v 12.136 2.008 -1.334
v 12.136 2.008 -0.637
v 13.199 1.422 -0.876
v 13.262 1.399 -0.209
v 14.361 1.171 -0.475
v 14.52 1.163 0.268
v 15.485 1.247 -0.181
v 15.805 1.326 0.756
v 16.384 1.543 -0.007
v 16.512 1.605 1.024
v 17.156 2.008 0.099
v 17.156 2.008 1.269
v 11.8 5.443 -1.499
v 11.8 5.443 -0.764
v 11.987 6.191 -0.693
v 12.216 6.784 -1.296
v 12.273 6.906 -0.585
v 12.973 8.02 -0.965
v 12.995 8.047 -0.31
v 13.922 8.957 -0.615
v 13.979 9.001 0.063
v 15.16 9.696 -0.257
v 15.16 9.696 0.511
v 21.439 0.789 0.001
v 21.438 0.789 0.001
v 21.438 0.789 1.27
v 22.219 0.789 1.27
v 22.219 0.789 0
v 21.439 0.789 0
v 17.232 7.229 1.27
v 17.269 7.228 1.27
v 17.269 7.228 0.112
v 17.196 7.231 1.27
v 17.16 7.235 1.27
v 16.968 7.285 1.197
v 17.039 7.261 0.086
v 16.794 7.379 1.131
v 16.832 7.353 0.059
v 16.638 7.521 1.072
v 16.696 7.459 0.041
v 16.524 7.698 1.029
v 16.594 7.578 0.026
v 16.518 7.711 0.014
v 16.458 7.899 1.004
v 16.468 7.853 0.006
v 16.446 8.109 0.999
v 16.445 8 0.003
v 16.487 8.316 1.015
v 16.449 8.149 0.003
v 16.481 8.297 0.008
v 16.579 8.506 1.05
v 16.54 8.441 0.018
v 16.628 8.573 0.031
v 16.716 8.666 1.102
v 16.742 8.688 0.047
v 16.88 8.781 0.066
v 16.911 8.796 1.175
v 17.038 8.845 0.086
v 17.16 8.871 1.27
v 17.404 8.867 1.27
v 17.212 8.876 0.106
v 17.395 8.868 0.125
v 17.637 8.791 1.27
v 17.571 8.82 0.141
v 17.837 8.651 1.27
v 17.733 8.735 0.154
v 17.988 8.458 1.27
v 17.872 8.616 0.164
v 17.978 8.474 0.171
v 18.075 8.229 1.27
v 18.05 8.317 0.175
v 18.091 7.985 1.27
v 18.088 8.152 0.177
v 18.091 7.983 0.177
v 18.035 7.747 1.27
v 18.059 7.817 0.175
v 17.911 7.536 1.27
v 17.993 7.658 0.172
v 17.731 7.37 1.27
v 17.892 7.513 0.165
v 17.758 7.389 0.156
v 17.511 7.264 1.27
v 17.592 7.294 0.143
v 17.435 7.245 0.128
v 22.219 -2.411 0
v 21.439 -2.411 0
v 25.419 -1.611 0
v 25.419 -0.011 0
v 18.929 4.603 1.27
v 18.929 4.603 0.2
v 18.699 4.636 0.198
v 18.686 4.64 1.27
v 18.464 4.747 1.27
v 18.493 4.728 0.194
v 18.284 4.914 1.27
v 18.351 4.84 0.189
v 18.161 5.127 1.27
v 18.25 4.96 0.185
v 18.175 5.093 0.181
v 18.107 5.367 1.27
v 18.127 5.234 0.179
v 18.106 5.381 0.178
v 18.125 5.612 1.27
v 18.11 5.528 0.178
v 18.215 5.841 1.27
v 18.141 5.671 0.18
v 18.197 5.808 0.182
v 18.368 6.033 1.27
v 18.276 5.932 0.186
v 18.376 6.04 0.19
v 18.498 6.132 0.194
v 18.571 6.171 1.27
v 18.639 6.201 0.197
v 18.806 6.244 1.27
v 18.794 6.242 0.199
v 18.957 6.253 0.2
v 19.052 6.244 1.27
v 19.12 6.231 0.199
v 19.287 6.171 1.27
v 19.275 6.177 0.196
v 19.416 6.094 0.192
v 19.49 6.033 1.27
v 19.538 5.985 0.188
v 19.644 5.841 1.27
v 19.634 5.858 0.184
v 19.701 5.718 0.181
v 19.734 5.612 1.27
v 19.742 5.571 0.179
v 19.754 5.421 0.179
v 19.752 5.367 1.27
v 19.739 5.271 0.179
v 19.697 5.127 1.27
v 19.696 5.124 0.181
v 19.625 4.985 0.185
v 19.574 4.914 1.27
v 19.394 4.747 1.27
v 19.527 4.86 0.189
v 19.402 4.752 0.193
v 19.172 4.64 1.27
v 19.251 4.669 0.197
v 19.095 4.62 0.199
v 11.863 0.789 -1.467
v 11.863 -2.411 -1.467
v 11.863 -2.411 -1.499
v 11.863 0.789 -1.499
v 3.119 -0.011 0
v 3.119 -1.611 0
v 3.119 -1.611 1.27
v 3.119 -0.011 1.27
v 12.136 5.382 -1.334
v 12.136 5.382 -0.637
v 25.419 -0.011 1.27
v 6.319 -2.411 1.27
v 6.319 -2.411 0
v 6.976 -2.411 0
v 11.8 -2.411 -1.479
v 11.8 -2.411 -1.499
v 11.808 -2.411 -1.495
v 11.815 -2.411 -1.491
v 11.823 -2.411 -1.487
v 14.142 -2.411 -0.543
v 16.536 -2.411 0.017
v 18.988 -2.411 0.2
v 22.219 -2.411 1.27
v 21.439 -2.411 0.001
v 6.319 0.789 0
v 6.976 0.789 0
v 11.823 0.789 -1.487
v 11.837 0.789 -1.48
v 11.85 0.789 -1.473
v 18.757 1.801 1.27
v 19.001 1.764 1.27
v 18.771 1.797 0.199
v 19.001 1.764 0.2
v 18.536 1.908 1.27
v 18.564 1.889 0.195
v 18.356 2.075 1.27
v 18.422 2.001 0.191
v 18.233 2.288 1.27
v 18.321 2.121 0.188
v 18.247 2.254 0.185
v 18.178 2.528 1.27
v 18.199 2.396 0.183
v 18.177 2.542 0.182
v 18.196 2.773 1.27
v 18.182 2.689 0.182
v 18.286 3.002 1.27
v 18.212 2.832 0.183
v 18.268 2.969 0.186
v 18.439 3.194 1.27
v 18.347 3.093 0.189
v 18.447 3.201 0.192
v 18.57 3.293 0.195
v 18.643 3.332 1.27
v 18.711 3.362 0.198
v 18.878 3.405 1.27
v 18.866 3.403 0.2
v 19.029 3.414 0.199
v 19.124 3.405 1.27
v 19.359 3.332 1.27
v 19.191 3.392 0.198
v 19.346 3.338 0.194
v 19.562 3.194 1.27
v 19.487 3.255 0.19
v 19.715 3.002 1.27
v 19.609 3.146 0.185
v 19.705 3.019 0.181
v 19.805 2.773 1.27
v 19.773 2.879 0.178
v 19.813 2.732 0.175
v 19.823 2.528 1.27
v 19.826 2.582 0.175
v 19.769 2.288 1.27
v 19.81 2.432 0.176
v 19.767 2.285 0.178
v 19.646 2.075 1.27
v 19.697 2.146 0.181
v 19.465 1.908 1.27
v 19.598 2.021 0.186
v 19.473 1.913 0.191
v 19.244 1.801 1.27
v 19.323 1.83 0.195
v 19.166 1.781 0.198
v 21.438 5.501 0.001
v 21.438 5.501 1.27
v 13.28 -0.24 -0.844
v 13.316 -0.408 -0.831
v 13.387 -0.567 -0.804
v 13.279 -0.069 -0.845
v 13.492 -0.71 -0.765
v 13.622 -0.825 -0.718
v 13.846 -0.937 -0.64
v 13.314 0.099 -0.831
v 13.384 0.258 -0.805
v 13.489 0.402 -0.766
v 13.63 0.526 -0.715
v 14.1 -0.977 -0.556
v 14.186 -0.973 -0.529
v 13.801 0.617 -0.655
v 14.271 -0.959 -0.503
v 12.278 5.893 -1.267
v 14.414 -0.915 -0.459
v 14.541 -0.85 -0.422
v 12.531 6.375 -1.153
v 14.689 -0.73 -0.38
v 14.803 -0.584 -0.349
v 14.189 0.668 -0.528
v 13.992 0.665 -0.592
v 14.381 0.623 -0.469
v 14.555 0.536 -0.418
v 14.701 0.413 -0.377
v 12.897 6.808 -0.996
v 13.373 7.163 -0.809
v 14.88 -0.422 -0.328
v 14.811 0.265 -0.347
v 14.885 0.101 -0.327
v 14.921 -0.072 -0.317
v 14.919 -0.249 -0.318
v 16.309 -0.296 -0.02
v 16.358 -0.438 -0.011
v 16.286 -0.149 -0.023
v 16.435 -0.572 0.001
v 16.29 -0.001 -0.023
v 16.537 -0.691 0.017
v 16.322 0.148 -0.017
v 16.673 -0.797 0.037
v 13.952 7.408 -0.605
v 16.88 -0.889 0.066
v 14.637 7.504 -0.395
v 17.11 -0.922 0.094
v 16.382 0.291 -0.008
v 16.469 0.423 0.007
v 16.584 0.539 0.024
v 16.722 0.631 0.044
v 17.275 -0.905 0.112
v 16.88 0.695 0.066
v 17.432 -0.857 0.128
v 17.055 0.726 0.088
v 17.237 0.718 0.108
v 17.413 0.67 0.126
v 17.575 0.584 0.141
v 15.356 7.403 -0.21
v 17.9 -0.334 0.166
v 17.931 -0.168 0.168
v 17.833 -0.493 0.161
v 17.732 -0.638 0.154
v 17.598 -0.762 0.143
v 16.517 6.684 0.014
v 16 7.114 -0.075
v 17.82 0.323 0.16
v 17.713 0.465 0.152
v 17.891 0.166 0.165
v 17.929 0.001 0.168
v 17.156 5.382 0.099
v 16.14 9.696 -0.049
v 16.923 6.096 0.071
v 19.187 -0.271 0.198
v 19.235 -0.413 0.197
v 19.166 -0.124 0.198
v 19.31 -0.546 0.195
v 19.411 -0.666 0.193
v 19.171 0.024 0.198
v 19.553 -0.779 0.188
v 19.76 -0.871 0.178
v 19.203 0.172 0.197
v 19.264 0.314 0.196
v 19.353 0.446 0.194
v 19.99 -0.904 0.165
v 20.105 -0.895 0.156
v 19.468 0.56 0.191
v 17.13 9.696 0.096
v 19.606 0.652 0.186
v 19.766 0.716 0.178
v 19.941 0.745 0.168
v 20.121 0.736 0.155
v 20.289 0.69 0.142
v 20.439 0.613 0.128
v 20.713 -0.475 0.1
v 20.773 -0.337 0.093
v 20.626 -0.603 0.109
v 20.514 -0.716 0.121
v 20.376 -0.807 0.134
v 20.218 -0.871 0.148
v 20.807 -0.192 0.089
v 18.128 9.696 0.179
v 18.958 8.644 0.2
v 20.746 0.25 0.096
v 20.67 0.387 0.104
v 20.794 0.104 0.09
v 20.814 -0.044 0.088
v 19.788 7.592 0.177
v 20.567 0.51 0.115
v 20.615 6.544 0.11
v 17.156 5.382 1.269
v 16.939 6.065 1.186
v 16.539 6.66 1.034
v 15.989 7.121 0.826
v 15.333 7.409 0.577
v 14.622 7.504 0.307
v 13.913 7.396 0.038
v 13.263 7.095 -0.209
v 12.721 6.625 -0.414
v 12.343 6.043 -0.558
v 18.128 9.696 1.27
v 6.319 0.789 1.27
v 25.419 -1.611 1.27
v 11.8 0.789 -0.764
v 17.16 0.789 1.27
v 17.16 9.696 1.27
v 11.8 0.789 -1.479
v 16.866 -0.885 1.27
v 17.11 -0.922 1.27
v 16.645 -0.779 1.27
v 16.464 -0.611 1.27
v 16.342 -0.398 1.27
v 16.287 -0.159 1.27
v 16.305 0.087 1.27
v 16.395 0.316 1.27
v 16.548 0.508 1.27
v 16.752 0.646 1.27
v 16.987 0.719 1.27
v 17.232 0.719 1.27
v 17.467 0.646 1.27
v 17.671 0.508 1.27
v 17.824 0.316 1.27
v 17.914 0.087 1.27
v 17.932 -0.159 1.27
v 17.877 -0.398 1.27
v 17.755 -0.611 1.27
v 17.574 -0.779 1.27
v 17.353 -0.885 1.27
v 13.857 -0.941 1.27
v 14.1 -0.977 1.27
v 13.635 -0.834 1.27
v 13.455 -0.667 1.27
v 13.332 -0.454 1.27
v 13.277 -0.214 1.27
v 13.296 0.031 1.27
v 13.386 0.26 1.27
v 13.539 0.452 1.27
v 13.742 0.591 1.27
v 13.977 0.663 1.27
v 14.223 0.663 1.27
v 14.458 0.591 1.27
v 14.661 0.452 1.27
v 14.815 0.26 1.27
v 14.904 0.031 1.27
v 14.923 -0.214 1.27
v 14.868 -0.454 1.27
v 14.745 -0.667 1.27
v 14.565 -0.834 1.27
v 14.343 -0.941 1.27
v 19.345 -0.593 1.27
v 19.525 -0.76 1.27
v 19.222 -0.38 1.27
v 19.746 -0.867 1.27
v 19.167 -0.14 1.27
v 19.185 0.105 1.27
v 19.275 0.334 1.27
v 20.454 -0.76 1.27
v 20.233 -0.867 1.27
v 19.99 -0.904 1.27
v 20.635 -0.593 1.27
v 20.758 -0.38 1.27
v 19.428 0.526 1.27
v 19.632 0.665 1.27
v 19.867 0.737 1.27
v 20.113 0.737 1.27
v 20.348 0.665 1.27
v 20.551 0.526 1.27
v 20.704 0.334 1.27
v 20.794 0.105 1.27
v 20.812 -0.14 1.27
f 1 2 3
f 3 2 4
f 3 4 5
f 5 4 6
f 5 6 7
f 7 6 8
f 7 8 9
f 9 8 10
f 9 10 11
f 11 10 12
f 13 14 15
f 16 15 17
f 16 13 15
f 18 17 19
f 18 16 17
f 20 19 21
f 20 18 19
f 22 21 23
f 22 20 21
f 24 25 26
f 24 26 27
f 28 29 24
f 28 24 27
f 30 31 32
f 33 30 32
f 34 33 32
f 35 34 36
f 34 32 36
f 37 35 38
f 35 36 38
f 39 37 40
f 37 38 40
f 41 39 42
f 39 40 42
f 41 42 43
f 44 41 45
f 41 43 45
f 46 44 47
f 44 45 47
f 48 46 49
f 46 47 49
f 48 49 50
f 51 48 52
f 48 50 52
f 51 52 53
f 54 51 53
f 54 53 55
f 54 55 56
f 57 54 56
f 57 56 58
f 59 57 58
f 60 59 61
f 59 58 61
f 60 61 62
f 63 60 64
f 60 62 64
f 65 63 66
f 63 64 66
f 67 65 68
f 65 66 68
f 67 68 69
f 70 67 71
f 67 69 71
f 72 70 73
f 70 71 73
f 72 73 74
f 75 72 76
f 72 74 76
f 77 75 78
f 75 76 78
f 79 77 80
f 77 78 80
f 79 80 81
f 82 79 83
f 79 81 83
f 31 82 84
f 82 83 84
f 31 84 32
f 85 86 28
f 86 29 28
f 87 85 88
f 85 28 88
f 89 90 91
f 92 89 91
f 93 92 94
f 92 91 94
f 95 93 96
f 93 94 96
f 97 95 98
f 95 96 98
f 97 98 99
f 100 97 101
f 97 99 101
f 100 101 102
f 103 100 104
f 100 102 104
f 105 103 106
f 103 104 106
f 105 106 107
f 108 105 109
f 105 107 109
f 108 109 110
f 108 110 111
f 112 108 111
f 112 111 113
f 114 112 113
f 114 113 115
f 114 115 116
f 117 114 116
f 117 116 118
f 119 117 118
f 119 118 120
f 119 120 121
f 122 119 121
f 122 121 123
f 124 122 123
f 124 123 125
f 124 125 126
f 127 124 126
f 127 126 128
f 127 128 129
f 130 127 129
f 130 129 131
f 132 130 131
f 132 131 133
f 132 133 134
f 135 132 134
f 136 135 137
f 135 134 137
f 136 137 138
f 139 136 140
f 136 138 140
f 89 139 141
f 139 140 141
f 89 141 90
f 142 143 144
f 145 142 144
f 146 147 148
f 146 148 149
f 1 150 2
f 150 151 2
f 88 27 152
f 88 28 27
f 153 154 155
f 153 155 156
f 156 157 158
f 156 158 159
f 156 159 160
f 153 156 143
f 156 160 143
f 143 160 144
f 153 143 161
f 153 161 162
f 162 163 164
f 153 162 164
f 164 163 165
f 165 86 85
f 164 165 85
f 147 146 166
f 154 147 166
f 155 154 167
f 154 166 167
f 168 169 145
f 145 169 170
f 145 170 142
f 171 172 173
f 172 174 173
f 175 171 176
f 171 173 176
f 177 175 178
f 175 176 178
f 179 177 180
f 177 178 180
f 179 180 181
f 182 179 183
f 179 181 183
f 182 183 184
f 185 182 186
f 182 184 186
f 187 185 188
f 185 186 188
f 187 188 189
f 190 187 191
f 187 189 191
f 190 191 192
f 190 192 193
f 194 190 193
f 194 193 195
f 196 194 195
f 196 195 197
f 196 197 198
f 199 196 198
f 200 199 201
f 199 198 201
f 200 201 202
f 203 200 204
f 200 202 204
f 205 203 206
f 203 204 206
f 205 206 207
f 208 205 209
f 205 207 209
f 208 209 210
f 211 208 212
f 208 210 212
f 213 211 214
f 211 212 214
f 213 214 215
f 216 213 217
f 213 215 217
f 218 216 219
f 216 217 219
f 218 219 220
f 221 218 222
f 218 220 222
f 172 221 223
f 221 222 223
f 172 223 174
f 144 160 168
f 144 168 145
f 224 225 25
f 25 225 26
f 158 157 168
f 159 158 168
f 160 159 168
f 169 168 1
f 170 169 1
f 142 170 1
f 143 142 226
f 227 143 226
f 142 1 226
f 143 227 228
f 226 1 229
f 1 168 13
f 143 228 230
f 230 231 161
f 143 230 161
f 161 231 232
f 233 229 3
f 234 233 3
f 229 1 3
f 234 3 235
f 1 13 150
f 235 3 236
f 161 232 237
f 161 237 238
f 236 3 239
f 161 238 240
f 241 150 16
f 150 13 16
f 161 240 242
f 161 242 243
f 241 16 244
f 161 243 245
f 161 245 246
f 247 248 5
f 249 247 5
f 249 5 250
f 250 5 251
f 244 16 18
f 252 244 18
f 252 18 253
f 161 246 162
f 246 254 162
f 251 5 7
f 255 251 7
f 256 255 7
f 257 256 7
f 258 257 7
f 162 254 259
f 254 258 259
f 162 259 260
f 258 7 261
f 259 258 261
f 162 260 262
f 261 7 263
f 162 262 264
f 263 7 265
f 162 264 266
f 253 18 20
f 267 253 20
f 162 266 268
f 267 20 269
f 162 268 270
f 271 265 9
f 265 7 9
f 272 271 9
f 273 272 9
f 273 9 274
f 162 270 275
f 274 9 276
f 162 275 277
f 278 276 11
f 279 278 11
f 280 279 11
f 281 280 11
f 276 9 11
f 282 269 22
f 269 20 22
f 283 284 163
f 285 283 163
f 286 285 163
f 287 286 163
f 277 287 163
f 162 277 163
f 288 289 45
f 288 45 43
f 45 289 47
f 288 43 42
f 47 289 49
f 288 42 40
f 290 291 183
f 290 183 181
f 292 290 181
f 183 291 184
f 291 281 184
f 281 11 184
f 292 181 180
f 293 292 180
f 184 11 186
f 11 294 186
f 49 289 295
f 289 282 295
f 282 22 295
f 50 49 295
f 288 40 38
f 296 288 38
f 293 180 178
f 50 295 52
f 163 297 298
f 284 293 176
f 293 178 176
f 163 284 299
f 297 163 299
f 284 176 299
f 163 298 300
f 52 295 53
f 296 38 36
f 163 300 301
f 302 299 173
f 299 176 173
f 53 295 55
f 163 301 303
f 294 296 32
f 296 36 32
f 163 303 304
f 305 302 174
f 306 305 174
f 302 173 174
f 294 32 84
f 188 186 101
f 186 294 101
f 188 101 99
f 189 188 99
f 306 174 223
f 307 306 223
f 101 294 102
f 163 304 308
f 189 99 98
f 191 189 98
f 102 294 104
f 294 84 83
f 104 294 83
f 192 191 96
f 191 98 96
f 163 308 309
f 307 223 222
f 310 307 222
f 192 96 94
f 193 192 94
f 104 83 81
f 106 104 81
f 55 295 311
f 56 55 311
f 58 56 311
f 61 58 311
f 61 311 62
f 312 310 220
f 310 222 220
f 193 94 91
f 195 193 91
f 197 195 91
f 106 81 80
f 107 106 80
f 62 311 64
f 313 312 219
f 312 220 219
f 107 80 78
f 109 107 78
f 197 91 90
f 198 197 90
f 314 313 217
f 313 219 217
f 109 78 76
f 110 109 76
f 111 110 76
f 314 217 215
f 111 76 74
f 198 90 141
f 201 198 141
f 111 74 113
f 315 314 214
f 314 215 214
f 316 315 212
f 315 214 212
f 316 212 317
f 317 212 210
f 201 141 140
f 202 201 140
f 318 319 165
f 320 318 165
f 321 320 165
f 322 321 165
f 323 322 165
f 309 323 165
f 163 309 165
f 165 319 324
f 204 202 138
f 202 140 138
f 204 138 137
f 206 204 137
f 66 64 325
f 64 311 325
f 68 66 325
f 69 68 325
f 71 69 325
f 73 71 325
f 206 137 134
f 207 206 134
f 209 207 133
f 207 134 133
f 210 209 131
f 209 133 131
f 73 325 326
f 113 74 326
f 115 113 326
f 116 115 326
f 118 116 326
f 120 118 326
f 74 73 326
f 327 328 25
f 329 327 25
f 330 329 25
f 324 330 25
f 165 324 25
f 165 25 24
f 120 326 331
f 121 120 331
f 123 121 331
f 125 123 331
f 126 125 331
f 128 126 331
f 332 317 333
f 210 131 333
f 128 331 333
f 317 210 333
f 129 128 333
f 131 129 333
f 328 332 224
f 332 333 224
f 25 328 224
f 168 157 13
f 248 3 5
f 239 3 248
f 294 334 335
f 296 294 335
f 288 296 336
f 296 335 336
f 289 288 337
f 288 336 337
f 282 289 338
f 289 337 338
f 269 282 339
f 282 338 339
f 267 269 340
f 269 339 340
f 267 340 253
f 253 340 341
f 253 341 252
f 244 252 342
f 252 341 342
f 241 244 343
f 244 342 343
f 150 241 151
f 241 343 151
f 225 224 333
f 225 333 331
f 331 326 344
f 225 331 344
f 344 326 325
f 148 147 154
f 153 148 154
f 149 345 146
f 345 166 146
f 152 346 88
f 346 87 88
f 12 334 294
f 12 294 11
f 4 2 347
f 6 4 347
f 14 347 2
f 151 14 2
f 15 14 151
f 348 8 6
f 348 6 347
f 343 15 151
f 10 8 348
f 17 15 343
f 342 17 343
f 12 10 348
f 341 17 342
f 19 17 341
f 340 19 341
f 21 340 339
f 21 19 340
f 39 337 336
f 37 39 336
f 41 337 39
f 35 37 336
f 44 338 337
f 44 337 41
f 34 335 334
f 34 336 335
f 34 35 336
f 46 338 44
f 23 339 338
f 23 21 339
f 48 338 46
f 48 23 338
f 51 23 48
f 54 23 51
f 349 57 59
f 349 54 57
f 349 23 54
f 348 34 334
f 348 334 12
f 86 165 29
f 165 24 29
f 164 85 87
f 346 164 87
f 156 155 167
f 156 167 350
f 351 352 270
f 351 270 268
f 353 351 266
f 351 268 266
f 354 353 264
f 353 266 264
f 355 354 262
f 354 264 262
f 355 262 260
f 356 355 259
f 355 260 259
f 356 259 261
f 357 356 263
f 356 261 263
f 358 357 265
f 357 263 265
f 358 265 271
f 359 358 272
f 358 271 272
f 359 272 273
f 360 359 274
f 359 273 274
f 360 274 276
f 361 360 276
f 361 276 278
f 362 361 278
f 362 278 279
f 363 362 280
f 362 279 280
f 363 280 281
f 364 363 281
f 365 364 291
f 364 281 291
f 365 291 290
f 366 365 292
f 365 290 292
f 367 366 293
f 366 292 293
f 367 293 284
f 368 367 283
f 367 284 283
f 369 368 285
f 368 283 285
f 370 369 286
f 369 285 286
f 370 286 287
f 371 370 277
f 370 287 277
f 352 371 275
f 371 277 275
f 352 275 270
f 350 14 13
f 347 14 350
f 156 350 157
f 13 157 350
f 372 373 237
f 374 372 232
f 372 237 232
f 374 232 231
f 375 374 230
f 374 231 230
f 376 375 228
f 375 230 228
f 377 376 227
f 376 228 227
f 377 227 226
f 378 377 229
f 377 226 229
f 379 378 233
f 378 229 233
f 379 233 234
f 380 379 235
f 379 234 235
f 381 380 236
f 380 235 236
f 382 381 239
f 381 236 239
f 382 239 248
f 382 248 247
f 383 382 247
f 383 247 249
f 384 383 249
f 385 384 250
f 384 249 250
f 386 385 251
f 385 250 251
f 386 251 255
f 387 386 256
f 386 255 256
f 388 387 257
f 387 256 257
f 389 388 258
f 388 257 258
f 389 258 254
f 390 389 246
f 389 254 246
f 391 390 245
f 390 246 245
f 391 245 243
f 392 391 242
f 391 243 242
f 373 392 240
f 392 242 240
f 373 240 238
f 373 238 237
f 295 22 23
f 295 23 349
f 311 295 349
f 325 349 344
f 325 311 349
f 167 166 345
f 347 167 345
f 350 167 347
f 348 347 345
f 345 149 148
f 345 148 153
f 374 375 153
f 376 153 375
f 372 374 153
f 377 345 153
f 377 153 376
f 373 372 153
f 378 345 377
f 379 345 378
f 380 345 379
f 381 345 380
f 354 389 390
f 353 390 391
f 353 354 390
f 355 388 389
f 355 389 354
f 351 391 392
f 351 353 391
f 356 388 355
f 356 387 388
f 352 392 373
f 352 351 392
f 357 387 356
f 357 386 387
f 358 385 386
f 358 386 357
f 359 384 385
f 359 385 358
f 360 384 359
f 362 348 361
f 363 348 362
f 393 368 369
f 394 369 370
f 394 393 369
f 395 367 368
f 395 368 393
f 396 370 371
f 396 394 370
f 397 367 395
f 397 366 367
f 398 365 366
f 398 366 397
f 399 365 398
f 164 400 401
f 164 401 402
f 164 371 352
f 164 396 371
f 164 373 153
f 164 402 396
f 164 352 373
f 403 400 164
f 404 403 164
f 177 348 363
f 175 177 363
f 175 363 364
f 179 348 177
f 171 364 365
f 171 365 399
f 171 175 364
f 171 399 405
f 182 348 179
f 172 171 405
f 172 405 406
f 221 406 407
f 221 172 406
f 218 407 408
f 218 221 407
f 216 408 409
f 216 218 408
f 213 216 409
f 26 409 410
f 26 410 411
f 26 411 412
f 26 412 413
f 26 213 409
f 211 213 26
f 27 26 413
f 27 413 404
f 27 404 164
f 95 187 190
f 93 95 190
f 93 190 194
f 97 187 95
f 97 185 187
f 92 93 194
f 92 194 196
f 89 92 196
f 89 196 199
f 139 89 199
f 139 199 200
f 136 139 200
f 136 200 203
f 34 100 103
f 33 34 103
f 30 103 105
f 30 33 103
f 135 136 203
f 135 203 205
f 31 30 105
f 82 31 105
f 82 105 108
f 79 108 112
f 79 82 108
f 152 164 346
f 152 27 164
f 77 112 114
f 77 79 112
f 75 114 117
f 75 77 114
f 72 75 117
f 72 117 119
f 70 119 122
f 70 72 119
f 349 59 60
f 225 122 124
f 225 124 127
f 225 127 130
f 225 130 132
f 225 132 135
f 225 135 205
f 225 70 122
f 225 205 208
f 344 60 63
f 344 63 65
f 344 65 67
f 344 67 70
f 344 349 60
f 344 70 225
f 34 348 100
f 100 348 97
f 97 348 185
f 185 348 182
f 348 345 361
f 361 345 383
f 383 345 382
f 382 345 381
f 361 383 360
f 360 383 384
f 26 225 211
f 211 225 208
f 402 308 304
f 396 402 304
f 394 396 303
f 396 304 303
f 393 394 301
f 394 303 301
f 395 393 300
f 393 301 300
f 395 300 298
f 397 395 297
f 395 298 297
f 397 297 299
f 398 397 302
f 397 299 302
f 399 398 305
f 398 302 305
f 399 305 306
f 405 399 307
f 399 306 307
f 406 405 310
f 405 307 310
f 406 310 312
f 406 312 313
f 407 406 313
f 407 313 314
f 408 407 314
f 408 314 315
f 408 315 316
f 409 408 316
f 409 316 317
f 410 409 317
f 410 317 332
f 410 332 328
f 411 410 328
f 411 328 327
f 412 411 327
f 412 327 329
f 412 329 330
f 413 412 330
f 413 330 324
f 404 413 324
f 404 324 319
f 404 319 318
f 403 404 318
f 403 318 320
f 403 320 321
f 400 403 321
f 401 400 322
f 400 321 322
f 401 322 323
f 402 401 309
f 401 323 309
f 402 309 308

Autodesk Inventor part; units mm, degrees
sketch "HeadplateSketch" plane through (0, 0, 0) normal (0, 0, 1) x (1, 0, 0)
  line L0 (22.2193, -2.4109) -> (25.4193, -1.6109)
  line L1 (25.4193, -1.6109) -> (25.4193, -0.0109)
  line L2 (6.3193, 0.7891) -> (3.1193, -0.0109)
  line L3 (3.1193, -1.6109) -> (3.1193, -0.0109)
  line L4 (6.3193, 0.7891) -> (22.2193, 0.7891)
  line L5 (22.2193, 0.7891) -> (25.4193, -0.0109)
  line L6 (17.1922, 9.6958) -> (17.1922, -2.4109)
  line L7 (17.1922, 9.6958) -> (18.128, 9.6958)
  line L8 (17.1922, 9.6958) -> (15.1602, 9.6958)
  line L9 (11.7996, 5.443) -> (11.7996, -2.4109)
  line L10 (21.4383, 5.5008) -> (21.4383, -2.4109)
  line L11 (21.4383, 5.5008) -> (18.128, 9.6958)
  arc A0 (15.1602, 9.6958) -> (11.7996, 5.443) centre (17.4689, 4.4173) ccw
  line L12 (3.1193, -1.6109) -> (6.3193, -2.4109)
  line L13 (6.3193, -2.4109) -> (22.2193, -2.4109)
  point P0 (11.7996, 0.7891)
  dimension "d95" = 3.2
  dimension "d102" = 1.6
  dimension "d104" = 3.2
  dimension "d106" = 0.8
  dimension "d109" = 1.6
  dimension "d110" = 3.2
  dimension "d112" = 22.3
  dimension "d113" = 15.9
extrude "拉伸1" add sketch "HeadplateSketch" along normal blind 1.27
extrude "拉伸8" add sketch "HeadplateSketch" against normal blind 1.5 contours L13 L6 L4 L10 | L4 L6 L7 L11 L10 | L13 L9 L4 L6 | L4 L9 A0 L8 L6
sketch "草图2" plane through (15.1602, 9.6958, 1.27) normal (0, 1, 0) x (1, 0, 0)
  line L0 (-3.3633, 2.0352) -> (1.9994, 0)
  arc A0 (-3.3633, 2.77) -> (6.2787, 1.2693) centre (3.7754, 16.9113) ccw
  line L1 (1.9994, 0) -> (6.2787, 0)
  line L2 (-3.3633, 2.77) -> (6.2787, 2.77)
  line L3 (2.9678, 2.77) -> (0, 2.77) projected
  line L4 (6.2787, 1.2693) -> (6.2787, 2.77)
  line L5 (-3.3633, 0) -> (1.9994, 0)
  line L6 (0, 0) -> (2.9678, 0) projected
  line L7 (2.9678, 0) -> (2.9678, 2.77) projected
  line L8 (-3.3633, 0) -> (-3.3633, 2.0352)
extrude "拉伸4" cut sketch "草图2" against normal up to next contours A0 L2 L7 | L7 L2 L4 A0
sketch "草图6" plane through (6.3193, -2.4109, 0) normal (0, -1, 0) x (1, 0, 0)
  line L0 (0, 0) -> (5.5435, 0)
  line L1 (0.6566, 0) -> (5.5435, -1.4987)
  line L2 (5.5435, 0) -> (5.5435, -1.4987)
  line L3 (0.6566, 0) -> (5.5435, 0)
  arc A0 (15.1197, 0.0007) -> (5.4803, -1.4987) centre (12.6164, -15.6413) ccw projected
  line L4 (15.1197, 0.0007) -> (15.1197, 0) projected
  line L5 (15.1197, 0) -> (15.9, 0) projected
  line L6 (15.9, 0) -> (15.9, 1.27) projected
  line L7 (15.9, 1.27) -> (0, 1.27) projected
  line L8 (0, 0) -> (0, 1.27) projected
  line L9 (0, 0) -> (5.4803, 0) projected
  line L10 (5.4803, 0) -> (5.4803, -1.4987) projected
extrude "拉伸7" add sketch "草图6" against normal up to surface (3.2 mm away) contours L0 L10 L1 | L0 L2 A0 L1 L10 | A0 L2 L1
sketch "草图3" plane through (6.3193, 0.7891, 0) normal (0, 1, 0) x (1, 0, 0)
  line L0 (0, -1.27) -> (5.4803, -1.27) projected
  line L1 (5.4803, 0) -> (5.4803, -1.27) projected
  line L2 (5.4803, 0) -> (0, 0) projected
  line L3 (0, 0) -> (0, -1.27) projected
  line L4 (5.4803, -1.27) -> (16.1538, -1.27)
  line L5 (16.1538, -1.27) -> (17.1139, -1.27)
  line L6 (17.1139, -1.27) -> (17.1139, 0.0011)
extrude "拉伸9" cut sketch "草图2" against normal up to surface (8.9067 mm away) contours L0 L5 L8
sketch "草图4" plane through (0, 0, 1.27) normal (0, 0, 1) x (1, 0, 0)
  circle A0 centre (17.2686, 8.053) radius 0.825
  circle A1 centre (18.9292, 5.4282) radius 0.825
  circle A2 centre (19.0006, 2.5892) radius 0.825
  circle A3 centre (17.1095, -0.097) radius 0.825
  line L0 (6.3193, 0.7891) -> (11.7996, 0.7891) projected
  line L1 (12.1356, 5.3815) -> (12.1356, 2.0023)
  line L2 (12.1356, 5.3815) -> (17.1561, 5.3815)
  line L3 (17.1561, 5.3815) -> (17.1561, 2.008)
  line L4 (17.1561, 2.008) -> (12.1356, 2.008)
  line L5 (11.7983, 4.0675) -> (12.1356, 4.0675)
  arc A4 (17.1561, 5.3815) -> (12.1356, 5.3815) centre (14.6459, 4.9584) ccw
  arc A5 (12.1356, 2.008) -> (17.1561, 2.008) centre (14.6459, 5.3033) ccw
  circle A6 centre (19.9896, -0.0785) radius 0.825
  circle A7 centre (14.1001, -0.1524) radius 0.825
extrude "拉伸10" cut sketch "草图4" against normal through all contours L2 L3 L4 L1 | A4 L2 | L4 A5
hole "打孔7" at (18.9292, 5.4282, 1.27) at (19.0006, 2.5892, 1.27) at (17.1095, -0.097, 1.27) at (17.2686, 8.053, 1.27) direction (0, 0, -1) diameter 1.65 end through all
hole "打孔8" at (14.1001, -0.1524, 1.27) at (19.9896, -0.0785, 1.27) direction (0, 0, -1) diameter 1.65 end through all
sketch "Sketch8" plane through (0, 0, 0) normal (0, 0, 1) x (1, 0, 0)
  arc A0 (17.1561, 5.3815) -> (12.1356, 5.3815) centre (14.6459, 4.9584) ccw projected
  arc A1 (12.1356, 2.008) -> (17.1561, 2.008) centre (14.6459, 5.3033) ccw projected
  line L0 (17.1596, 7.2353) -> (17.1596, 0.7891) projected
  line L1 (12.1356, 2.008) -> (12.1356, 5.3815) projected
  line L2 (14.6459, 7.5041) -> (14.6459, 1.1608)
  line L3 (17.1596, 4.3324) -> (12.1356, 4.3324)
  line L4 (-5.0839, 0) -> (30.5031, 0) projected
  line L5 (0, 12.1209) -> (0, -4.8328) projected
  point P0 (0, 0)
  dimension "d116" = 6.3433
  dimension "d117" = 3.1717
  dimension "d118" = 14.6459
  dimension "d119" = 4.3324
sketch "Sketch9" plane through (11.7996, 0.7891, -0.7642) normal (-0.3548, 0, 0.9349) x (0.9349, 0, 0.3548)
  ellipse E0 centre (5.8496, 7.2639) end of major axis (6.7321, 7.2639) minor radius 0.825 (5.7331, 8.0816) -> (5.7331, 6.4461) ccw projected
  line L0 (5.7331, 8.9067) -> (5.7331, 8.0816) projected
  line L1 (3.5945, 8.9067) -> (5.7331, 8.9067) projected
  ellipse E1 centre (6.0638, 3.6282) end of major axis (-0.0984, 3.6282) minor radius 5.7613 (3.5945, 8.9067) -> (0, 4.6539) ccw projected
  line L2 (0, 0) -> (0, 4.6539) projected
  line L3 (0, 0) -> (5.7331, 0) projected
  line L4 (5.7331, 6.4461) -> (5.7331, 0) projected
  line L5 (5.7293, 4.5923) -> (5.7293, 1.2188) projected
  ellipse E2 centre (3.0444, 4.5141) end of major axis (-1.3864, 4.5141) minor radius 4.1425 (0.3594, 1.2188) -> (5.7293, 1.2188) ccw projected
  line L6 (0.3594, 1.2188) -> (0.3594, 4.5923) projected
  ellipse E3 centre (3.0444, 4.1693) end of major axis (5.7672, 4.1693) minor radius 2.5457 (5.7293, 4.5923) -> (0.3594, 4.5923) ccw projected
  line L7 (5.3145, 1.2188) -> (5.3145, 4.5923) projected
  arc A0 (0.112, 1.2188) -> (5.3145, 1.2188) centre (5.3145, 1.2188) ccw projected
  arc A1 (5.3145, 4.5923) -> (0.112, 4.5923) centre (0.112, 4.5923) ccw projected
  line L8 (5.3145, 4.5923) -> (0.3594, 4.5923)
  line L9 (2.8369, 6.7075) -> (4.6638, 6.7075)
  line L10 (2.8369, 0.3762) -> (5.3145, 0.3762)
  line L11 (2.8369, 6.7075) -> (2.8369, 0.3762)
  line L12 (2.8369, 3.5419) -> (5.3145, 3.5419)
  line L13 (2.9322, 6.7149) -> (2.9322, 0.3716) projected
  point P0 (-10.7607, -0.7891)
  dimension "d121" = 0.0953
ref_plane "Work Plane3" through (11.7996, 0.7891, -0.7642) normal (-0.3548, 0, 0.9349) x (0.9349, 0, 0.3548)
ref_plane "Work Plane1" through (14.558, 0, 0) normal (1, 0, 0) x (0, 1, 0)
ref_plane "Work Plane2" through (0, 4.332, 0) normal (0, 1, 0) x (-1, 0, 0)
ref_plane "Work Plane4" through (0, 0, 0.283) normal (0, 0, 1) x (1, 0, 0)
sketch "Sketch10" plane through (0, 0, 0) normal (0, 0, 1) x (1, 0, 0)
  line L0 (3.1193, -1.6109) -> (3.1193, -0.0109) projected
  line L1 (3.1193, -0.8109) -> (0, -0.8109)
  line L2 (25.404, -0.8109) -> (34.4809, -0.8109)
  point P0 (0, 0)
  dimension "d126" = 0.8109
ref_plane "Work Plane5" through (0, -0.811, 0) normal (0, 1, 0) x (-1, 0, 0)
sketch "Sketch11" plane through (11.7996, 0.7891, -0.7642) normal (-0.3548, 0, 0.9349) x (0.9349, 0, 0.3548)
  ellipse E0 centre (5.8496, 7.2639) end of major axis (6.7321, 7.2639) minor radius 0.825 (5.7331, 8.0816) -> (5.7331, 6.4461) ccw projected
  line L0 (5.7331, 8.9067) -> (5.7331, 8.0816) projected
  line L1 (3.5945, 8.9067) -> (5.7331, 8.9067) projected
  ellipse E1 centre (6.0638, 3.6282) end of major axis (-0.0984, 3.6282) minor radius 5.7613 (3.5945, 8.9067) -> (0, 4.6539) ccw projected
  line L2 (0, 0) -> (0, 4.6539) projected
  line L3 (0, 0) -> (5.7331, 0) projected
  line L4 (5.7331, 6.4461) -> (5.7331, 0) projected
  line L5 (5.7293, 4.5923) -> (5.7293, 1.2188) projected
  ellipse E2 centre (3.0444, 4.5141) end of major axis (-1.3864, 4.5141) minor radius 4.1425 (0.3594, 1.2188) -> (5.7293, 1.2188) ccw projected
  line L6 (0.3594, 1.2188) -> (0.3594, 4.5923) projected
  ellipse E3 centre (3.0444, 4.1693) end of major axis (5.7672, 4.1693) minor radius 2.5457 (5.7293, 4.5923) -> (0.3594, 4.5923) ccw projected
  circle A0 centre (3.0444, 3.5307) radius 3.5
  point P0 (-10.7607, -0.7891)
  dimension "d128" = 7
ref_plane "Work Plane6" through (12.0474, 0.7891, -1.4172) normal (-0.3548, 0, 0.9349) x (0.9349, 0, 0.3548)
sketch "Sketch12" plane through (0, 0, 1.27) normal (0, 0, 1) x (1, 0, 0)
  circle A0 centre (17.1095, -0.097) radius 0.825 projected
  line L0 (14.541, 7.5041) -> (14.541, 1.1608) projected
  point P0 (0, 0)
  dimension "d130" = 2.5684
equation "\"d117\" = 0.5 * d116"
properties part number "MPS Headpost" material "Titanium"
